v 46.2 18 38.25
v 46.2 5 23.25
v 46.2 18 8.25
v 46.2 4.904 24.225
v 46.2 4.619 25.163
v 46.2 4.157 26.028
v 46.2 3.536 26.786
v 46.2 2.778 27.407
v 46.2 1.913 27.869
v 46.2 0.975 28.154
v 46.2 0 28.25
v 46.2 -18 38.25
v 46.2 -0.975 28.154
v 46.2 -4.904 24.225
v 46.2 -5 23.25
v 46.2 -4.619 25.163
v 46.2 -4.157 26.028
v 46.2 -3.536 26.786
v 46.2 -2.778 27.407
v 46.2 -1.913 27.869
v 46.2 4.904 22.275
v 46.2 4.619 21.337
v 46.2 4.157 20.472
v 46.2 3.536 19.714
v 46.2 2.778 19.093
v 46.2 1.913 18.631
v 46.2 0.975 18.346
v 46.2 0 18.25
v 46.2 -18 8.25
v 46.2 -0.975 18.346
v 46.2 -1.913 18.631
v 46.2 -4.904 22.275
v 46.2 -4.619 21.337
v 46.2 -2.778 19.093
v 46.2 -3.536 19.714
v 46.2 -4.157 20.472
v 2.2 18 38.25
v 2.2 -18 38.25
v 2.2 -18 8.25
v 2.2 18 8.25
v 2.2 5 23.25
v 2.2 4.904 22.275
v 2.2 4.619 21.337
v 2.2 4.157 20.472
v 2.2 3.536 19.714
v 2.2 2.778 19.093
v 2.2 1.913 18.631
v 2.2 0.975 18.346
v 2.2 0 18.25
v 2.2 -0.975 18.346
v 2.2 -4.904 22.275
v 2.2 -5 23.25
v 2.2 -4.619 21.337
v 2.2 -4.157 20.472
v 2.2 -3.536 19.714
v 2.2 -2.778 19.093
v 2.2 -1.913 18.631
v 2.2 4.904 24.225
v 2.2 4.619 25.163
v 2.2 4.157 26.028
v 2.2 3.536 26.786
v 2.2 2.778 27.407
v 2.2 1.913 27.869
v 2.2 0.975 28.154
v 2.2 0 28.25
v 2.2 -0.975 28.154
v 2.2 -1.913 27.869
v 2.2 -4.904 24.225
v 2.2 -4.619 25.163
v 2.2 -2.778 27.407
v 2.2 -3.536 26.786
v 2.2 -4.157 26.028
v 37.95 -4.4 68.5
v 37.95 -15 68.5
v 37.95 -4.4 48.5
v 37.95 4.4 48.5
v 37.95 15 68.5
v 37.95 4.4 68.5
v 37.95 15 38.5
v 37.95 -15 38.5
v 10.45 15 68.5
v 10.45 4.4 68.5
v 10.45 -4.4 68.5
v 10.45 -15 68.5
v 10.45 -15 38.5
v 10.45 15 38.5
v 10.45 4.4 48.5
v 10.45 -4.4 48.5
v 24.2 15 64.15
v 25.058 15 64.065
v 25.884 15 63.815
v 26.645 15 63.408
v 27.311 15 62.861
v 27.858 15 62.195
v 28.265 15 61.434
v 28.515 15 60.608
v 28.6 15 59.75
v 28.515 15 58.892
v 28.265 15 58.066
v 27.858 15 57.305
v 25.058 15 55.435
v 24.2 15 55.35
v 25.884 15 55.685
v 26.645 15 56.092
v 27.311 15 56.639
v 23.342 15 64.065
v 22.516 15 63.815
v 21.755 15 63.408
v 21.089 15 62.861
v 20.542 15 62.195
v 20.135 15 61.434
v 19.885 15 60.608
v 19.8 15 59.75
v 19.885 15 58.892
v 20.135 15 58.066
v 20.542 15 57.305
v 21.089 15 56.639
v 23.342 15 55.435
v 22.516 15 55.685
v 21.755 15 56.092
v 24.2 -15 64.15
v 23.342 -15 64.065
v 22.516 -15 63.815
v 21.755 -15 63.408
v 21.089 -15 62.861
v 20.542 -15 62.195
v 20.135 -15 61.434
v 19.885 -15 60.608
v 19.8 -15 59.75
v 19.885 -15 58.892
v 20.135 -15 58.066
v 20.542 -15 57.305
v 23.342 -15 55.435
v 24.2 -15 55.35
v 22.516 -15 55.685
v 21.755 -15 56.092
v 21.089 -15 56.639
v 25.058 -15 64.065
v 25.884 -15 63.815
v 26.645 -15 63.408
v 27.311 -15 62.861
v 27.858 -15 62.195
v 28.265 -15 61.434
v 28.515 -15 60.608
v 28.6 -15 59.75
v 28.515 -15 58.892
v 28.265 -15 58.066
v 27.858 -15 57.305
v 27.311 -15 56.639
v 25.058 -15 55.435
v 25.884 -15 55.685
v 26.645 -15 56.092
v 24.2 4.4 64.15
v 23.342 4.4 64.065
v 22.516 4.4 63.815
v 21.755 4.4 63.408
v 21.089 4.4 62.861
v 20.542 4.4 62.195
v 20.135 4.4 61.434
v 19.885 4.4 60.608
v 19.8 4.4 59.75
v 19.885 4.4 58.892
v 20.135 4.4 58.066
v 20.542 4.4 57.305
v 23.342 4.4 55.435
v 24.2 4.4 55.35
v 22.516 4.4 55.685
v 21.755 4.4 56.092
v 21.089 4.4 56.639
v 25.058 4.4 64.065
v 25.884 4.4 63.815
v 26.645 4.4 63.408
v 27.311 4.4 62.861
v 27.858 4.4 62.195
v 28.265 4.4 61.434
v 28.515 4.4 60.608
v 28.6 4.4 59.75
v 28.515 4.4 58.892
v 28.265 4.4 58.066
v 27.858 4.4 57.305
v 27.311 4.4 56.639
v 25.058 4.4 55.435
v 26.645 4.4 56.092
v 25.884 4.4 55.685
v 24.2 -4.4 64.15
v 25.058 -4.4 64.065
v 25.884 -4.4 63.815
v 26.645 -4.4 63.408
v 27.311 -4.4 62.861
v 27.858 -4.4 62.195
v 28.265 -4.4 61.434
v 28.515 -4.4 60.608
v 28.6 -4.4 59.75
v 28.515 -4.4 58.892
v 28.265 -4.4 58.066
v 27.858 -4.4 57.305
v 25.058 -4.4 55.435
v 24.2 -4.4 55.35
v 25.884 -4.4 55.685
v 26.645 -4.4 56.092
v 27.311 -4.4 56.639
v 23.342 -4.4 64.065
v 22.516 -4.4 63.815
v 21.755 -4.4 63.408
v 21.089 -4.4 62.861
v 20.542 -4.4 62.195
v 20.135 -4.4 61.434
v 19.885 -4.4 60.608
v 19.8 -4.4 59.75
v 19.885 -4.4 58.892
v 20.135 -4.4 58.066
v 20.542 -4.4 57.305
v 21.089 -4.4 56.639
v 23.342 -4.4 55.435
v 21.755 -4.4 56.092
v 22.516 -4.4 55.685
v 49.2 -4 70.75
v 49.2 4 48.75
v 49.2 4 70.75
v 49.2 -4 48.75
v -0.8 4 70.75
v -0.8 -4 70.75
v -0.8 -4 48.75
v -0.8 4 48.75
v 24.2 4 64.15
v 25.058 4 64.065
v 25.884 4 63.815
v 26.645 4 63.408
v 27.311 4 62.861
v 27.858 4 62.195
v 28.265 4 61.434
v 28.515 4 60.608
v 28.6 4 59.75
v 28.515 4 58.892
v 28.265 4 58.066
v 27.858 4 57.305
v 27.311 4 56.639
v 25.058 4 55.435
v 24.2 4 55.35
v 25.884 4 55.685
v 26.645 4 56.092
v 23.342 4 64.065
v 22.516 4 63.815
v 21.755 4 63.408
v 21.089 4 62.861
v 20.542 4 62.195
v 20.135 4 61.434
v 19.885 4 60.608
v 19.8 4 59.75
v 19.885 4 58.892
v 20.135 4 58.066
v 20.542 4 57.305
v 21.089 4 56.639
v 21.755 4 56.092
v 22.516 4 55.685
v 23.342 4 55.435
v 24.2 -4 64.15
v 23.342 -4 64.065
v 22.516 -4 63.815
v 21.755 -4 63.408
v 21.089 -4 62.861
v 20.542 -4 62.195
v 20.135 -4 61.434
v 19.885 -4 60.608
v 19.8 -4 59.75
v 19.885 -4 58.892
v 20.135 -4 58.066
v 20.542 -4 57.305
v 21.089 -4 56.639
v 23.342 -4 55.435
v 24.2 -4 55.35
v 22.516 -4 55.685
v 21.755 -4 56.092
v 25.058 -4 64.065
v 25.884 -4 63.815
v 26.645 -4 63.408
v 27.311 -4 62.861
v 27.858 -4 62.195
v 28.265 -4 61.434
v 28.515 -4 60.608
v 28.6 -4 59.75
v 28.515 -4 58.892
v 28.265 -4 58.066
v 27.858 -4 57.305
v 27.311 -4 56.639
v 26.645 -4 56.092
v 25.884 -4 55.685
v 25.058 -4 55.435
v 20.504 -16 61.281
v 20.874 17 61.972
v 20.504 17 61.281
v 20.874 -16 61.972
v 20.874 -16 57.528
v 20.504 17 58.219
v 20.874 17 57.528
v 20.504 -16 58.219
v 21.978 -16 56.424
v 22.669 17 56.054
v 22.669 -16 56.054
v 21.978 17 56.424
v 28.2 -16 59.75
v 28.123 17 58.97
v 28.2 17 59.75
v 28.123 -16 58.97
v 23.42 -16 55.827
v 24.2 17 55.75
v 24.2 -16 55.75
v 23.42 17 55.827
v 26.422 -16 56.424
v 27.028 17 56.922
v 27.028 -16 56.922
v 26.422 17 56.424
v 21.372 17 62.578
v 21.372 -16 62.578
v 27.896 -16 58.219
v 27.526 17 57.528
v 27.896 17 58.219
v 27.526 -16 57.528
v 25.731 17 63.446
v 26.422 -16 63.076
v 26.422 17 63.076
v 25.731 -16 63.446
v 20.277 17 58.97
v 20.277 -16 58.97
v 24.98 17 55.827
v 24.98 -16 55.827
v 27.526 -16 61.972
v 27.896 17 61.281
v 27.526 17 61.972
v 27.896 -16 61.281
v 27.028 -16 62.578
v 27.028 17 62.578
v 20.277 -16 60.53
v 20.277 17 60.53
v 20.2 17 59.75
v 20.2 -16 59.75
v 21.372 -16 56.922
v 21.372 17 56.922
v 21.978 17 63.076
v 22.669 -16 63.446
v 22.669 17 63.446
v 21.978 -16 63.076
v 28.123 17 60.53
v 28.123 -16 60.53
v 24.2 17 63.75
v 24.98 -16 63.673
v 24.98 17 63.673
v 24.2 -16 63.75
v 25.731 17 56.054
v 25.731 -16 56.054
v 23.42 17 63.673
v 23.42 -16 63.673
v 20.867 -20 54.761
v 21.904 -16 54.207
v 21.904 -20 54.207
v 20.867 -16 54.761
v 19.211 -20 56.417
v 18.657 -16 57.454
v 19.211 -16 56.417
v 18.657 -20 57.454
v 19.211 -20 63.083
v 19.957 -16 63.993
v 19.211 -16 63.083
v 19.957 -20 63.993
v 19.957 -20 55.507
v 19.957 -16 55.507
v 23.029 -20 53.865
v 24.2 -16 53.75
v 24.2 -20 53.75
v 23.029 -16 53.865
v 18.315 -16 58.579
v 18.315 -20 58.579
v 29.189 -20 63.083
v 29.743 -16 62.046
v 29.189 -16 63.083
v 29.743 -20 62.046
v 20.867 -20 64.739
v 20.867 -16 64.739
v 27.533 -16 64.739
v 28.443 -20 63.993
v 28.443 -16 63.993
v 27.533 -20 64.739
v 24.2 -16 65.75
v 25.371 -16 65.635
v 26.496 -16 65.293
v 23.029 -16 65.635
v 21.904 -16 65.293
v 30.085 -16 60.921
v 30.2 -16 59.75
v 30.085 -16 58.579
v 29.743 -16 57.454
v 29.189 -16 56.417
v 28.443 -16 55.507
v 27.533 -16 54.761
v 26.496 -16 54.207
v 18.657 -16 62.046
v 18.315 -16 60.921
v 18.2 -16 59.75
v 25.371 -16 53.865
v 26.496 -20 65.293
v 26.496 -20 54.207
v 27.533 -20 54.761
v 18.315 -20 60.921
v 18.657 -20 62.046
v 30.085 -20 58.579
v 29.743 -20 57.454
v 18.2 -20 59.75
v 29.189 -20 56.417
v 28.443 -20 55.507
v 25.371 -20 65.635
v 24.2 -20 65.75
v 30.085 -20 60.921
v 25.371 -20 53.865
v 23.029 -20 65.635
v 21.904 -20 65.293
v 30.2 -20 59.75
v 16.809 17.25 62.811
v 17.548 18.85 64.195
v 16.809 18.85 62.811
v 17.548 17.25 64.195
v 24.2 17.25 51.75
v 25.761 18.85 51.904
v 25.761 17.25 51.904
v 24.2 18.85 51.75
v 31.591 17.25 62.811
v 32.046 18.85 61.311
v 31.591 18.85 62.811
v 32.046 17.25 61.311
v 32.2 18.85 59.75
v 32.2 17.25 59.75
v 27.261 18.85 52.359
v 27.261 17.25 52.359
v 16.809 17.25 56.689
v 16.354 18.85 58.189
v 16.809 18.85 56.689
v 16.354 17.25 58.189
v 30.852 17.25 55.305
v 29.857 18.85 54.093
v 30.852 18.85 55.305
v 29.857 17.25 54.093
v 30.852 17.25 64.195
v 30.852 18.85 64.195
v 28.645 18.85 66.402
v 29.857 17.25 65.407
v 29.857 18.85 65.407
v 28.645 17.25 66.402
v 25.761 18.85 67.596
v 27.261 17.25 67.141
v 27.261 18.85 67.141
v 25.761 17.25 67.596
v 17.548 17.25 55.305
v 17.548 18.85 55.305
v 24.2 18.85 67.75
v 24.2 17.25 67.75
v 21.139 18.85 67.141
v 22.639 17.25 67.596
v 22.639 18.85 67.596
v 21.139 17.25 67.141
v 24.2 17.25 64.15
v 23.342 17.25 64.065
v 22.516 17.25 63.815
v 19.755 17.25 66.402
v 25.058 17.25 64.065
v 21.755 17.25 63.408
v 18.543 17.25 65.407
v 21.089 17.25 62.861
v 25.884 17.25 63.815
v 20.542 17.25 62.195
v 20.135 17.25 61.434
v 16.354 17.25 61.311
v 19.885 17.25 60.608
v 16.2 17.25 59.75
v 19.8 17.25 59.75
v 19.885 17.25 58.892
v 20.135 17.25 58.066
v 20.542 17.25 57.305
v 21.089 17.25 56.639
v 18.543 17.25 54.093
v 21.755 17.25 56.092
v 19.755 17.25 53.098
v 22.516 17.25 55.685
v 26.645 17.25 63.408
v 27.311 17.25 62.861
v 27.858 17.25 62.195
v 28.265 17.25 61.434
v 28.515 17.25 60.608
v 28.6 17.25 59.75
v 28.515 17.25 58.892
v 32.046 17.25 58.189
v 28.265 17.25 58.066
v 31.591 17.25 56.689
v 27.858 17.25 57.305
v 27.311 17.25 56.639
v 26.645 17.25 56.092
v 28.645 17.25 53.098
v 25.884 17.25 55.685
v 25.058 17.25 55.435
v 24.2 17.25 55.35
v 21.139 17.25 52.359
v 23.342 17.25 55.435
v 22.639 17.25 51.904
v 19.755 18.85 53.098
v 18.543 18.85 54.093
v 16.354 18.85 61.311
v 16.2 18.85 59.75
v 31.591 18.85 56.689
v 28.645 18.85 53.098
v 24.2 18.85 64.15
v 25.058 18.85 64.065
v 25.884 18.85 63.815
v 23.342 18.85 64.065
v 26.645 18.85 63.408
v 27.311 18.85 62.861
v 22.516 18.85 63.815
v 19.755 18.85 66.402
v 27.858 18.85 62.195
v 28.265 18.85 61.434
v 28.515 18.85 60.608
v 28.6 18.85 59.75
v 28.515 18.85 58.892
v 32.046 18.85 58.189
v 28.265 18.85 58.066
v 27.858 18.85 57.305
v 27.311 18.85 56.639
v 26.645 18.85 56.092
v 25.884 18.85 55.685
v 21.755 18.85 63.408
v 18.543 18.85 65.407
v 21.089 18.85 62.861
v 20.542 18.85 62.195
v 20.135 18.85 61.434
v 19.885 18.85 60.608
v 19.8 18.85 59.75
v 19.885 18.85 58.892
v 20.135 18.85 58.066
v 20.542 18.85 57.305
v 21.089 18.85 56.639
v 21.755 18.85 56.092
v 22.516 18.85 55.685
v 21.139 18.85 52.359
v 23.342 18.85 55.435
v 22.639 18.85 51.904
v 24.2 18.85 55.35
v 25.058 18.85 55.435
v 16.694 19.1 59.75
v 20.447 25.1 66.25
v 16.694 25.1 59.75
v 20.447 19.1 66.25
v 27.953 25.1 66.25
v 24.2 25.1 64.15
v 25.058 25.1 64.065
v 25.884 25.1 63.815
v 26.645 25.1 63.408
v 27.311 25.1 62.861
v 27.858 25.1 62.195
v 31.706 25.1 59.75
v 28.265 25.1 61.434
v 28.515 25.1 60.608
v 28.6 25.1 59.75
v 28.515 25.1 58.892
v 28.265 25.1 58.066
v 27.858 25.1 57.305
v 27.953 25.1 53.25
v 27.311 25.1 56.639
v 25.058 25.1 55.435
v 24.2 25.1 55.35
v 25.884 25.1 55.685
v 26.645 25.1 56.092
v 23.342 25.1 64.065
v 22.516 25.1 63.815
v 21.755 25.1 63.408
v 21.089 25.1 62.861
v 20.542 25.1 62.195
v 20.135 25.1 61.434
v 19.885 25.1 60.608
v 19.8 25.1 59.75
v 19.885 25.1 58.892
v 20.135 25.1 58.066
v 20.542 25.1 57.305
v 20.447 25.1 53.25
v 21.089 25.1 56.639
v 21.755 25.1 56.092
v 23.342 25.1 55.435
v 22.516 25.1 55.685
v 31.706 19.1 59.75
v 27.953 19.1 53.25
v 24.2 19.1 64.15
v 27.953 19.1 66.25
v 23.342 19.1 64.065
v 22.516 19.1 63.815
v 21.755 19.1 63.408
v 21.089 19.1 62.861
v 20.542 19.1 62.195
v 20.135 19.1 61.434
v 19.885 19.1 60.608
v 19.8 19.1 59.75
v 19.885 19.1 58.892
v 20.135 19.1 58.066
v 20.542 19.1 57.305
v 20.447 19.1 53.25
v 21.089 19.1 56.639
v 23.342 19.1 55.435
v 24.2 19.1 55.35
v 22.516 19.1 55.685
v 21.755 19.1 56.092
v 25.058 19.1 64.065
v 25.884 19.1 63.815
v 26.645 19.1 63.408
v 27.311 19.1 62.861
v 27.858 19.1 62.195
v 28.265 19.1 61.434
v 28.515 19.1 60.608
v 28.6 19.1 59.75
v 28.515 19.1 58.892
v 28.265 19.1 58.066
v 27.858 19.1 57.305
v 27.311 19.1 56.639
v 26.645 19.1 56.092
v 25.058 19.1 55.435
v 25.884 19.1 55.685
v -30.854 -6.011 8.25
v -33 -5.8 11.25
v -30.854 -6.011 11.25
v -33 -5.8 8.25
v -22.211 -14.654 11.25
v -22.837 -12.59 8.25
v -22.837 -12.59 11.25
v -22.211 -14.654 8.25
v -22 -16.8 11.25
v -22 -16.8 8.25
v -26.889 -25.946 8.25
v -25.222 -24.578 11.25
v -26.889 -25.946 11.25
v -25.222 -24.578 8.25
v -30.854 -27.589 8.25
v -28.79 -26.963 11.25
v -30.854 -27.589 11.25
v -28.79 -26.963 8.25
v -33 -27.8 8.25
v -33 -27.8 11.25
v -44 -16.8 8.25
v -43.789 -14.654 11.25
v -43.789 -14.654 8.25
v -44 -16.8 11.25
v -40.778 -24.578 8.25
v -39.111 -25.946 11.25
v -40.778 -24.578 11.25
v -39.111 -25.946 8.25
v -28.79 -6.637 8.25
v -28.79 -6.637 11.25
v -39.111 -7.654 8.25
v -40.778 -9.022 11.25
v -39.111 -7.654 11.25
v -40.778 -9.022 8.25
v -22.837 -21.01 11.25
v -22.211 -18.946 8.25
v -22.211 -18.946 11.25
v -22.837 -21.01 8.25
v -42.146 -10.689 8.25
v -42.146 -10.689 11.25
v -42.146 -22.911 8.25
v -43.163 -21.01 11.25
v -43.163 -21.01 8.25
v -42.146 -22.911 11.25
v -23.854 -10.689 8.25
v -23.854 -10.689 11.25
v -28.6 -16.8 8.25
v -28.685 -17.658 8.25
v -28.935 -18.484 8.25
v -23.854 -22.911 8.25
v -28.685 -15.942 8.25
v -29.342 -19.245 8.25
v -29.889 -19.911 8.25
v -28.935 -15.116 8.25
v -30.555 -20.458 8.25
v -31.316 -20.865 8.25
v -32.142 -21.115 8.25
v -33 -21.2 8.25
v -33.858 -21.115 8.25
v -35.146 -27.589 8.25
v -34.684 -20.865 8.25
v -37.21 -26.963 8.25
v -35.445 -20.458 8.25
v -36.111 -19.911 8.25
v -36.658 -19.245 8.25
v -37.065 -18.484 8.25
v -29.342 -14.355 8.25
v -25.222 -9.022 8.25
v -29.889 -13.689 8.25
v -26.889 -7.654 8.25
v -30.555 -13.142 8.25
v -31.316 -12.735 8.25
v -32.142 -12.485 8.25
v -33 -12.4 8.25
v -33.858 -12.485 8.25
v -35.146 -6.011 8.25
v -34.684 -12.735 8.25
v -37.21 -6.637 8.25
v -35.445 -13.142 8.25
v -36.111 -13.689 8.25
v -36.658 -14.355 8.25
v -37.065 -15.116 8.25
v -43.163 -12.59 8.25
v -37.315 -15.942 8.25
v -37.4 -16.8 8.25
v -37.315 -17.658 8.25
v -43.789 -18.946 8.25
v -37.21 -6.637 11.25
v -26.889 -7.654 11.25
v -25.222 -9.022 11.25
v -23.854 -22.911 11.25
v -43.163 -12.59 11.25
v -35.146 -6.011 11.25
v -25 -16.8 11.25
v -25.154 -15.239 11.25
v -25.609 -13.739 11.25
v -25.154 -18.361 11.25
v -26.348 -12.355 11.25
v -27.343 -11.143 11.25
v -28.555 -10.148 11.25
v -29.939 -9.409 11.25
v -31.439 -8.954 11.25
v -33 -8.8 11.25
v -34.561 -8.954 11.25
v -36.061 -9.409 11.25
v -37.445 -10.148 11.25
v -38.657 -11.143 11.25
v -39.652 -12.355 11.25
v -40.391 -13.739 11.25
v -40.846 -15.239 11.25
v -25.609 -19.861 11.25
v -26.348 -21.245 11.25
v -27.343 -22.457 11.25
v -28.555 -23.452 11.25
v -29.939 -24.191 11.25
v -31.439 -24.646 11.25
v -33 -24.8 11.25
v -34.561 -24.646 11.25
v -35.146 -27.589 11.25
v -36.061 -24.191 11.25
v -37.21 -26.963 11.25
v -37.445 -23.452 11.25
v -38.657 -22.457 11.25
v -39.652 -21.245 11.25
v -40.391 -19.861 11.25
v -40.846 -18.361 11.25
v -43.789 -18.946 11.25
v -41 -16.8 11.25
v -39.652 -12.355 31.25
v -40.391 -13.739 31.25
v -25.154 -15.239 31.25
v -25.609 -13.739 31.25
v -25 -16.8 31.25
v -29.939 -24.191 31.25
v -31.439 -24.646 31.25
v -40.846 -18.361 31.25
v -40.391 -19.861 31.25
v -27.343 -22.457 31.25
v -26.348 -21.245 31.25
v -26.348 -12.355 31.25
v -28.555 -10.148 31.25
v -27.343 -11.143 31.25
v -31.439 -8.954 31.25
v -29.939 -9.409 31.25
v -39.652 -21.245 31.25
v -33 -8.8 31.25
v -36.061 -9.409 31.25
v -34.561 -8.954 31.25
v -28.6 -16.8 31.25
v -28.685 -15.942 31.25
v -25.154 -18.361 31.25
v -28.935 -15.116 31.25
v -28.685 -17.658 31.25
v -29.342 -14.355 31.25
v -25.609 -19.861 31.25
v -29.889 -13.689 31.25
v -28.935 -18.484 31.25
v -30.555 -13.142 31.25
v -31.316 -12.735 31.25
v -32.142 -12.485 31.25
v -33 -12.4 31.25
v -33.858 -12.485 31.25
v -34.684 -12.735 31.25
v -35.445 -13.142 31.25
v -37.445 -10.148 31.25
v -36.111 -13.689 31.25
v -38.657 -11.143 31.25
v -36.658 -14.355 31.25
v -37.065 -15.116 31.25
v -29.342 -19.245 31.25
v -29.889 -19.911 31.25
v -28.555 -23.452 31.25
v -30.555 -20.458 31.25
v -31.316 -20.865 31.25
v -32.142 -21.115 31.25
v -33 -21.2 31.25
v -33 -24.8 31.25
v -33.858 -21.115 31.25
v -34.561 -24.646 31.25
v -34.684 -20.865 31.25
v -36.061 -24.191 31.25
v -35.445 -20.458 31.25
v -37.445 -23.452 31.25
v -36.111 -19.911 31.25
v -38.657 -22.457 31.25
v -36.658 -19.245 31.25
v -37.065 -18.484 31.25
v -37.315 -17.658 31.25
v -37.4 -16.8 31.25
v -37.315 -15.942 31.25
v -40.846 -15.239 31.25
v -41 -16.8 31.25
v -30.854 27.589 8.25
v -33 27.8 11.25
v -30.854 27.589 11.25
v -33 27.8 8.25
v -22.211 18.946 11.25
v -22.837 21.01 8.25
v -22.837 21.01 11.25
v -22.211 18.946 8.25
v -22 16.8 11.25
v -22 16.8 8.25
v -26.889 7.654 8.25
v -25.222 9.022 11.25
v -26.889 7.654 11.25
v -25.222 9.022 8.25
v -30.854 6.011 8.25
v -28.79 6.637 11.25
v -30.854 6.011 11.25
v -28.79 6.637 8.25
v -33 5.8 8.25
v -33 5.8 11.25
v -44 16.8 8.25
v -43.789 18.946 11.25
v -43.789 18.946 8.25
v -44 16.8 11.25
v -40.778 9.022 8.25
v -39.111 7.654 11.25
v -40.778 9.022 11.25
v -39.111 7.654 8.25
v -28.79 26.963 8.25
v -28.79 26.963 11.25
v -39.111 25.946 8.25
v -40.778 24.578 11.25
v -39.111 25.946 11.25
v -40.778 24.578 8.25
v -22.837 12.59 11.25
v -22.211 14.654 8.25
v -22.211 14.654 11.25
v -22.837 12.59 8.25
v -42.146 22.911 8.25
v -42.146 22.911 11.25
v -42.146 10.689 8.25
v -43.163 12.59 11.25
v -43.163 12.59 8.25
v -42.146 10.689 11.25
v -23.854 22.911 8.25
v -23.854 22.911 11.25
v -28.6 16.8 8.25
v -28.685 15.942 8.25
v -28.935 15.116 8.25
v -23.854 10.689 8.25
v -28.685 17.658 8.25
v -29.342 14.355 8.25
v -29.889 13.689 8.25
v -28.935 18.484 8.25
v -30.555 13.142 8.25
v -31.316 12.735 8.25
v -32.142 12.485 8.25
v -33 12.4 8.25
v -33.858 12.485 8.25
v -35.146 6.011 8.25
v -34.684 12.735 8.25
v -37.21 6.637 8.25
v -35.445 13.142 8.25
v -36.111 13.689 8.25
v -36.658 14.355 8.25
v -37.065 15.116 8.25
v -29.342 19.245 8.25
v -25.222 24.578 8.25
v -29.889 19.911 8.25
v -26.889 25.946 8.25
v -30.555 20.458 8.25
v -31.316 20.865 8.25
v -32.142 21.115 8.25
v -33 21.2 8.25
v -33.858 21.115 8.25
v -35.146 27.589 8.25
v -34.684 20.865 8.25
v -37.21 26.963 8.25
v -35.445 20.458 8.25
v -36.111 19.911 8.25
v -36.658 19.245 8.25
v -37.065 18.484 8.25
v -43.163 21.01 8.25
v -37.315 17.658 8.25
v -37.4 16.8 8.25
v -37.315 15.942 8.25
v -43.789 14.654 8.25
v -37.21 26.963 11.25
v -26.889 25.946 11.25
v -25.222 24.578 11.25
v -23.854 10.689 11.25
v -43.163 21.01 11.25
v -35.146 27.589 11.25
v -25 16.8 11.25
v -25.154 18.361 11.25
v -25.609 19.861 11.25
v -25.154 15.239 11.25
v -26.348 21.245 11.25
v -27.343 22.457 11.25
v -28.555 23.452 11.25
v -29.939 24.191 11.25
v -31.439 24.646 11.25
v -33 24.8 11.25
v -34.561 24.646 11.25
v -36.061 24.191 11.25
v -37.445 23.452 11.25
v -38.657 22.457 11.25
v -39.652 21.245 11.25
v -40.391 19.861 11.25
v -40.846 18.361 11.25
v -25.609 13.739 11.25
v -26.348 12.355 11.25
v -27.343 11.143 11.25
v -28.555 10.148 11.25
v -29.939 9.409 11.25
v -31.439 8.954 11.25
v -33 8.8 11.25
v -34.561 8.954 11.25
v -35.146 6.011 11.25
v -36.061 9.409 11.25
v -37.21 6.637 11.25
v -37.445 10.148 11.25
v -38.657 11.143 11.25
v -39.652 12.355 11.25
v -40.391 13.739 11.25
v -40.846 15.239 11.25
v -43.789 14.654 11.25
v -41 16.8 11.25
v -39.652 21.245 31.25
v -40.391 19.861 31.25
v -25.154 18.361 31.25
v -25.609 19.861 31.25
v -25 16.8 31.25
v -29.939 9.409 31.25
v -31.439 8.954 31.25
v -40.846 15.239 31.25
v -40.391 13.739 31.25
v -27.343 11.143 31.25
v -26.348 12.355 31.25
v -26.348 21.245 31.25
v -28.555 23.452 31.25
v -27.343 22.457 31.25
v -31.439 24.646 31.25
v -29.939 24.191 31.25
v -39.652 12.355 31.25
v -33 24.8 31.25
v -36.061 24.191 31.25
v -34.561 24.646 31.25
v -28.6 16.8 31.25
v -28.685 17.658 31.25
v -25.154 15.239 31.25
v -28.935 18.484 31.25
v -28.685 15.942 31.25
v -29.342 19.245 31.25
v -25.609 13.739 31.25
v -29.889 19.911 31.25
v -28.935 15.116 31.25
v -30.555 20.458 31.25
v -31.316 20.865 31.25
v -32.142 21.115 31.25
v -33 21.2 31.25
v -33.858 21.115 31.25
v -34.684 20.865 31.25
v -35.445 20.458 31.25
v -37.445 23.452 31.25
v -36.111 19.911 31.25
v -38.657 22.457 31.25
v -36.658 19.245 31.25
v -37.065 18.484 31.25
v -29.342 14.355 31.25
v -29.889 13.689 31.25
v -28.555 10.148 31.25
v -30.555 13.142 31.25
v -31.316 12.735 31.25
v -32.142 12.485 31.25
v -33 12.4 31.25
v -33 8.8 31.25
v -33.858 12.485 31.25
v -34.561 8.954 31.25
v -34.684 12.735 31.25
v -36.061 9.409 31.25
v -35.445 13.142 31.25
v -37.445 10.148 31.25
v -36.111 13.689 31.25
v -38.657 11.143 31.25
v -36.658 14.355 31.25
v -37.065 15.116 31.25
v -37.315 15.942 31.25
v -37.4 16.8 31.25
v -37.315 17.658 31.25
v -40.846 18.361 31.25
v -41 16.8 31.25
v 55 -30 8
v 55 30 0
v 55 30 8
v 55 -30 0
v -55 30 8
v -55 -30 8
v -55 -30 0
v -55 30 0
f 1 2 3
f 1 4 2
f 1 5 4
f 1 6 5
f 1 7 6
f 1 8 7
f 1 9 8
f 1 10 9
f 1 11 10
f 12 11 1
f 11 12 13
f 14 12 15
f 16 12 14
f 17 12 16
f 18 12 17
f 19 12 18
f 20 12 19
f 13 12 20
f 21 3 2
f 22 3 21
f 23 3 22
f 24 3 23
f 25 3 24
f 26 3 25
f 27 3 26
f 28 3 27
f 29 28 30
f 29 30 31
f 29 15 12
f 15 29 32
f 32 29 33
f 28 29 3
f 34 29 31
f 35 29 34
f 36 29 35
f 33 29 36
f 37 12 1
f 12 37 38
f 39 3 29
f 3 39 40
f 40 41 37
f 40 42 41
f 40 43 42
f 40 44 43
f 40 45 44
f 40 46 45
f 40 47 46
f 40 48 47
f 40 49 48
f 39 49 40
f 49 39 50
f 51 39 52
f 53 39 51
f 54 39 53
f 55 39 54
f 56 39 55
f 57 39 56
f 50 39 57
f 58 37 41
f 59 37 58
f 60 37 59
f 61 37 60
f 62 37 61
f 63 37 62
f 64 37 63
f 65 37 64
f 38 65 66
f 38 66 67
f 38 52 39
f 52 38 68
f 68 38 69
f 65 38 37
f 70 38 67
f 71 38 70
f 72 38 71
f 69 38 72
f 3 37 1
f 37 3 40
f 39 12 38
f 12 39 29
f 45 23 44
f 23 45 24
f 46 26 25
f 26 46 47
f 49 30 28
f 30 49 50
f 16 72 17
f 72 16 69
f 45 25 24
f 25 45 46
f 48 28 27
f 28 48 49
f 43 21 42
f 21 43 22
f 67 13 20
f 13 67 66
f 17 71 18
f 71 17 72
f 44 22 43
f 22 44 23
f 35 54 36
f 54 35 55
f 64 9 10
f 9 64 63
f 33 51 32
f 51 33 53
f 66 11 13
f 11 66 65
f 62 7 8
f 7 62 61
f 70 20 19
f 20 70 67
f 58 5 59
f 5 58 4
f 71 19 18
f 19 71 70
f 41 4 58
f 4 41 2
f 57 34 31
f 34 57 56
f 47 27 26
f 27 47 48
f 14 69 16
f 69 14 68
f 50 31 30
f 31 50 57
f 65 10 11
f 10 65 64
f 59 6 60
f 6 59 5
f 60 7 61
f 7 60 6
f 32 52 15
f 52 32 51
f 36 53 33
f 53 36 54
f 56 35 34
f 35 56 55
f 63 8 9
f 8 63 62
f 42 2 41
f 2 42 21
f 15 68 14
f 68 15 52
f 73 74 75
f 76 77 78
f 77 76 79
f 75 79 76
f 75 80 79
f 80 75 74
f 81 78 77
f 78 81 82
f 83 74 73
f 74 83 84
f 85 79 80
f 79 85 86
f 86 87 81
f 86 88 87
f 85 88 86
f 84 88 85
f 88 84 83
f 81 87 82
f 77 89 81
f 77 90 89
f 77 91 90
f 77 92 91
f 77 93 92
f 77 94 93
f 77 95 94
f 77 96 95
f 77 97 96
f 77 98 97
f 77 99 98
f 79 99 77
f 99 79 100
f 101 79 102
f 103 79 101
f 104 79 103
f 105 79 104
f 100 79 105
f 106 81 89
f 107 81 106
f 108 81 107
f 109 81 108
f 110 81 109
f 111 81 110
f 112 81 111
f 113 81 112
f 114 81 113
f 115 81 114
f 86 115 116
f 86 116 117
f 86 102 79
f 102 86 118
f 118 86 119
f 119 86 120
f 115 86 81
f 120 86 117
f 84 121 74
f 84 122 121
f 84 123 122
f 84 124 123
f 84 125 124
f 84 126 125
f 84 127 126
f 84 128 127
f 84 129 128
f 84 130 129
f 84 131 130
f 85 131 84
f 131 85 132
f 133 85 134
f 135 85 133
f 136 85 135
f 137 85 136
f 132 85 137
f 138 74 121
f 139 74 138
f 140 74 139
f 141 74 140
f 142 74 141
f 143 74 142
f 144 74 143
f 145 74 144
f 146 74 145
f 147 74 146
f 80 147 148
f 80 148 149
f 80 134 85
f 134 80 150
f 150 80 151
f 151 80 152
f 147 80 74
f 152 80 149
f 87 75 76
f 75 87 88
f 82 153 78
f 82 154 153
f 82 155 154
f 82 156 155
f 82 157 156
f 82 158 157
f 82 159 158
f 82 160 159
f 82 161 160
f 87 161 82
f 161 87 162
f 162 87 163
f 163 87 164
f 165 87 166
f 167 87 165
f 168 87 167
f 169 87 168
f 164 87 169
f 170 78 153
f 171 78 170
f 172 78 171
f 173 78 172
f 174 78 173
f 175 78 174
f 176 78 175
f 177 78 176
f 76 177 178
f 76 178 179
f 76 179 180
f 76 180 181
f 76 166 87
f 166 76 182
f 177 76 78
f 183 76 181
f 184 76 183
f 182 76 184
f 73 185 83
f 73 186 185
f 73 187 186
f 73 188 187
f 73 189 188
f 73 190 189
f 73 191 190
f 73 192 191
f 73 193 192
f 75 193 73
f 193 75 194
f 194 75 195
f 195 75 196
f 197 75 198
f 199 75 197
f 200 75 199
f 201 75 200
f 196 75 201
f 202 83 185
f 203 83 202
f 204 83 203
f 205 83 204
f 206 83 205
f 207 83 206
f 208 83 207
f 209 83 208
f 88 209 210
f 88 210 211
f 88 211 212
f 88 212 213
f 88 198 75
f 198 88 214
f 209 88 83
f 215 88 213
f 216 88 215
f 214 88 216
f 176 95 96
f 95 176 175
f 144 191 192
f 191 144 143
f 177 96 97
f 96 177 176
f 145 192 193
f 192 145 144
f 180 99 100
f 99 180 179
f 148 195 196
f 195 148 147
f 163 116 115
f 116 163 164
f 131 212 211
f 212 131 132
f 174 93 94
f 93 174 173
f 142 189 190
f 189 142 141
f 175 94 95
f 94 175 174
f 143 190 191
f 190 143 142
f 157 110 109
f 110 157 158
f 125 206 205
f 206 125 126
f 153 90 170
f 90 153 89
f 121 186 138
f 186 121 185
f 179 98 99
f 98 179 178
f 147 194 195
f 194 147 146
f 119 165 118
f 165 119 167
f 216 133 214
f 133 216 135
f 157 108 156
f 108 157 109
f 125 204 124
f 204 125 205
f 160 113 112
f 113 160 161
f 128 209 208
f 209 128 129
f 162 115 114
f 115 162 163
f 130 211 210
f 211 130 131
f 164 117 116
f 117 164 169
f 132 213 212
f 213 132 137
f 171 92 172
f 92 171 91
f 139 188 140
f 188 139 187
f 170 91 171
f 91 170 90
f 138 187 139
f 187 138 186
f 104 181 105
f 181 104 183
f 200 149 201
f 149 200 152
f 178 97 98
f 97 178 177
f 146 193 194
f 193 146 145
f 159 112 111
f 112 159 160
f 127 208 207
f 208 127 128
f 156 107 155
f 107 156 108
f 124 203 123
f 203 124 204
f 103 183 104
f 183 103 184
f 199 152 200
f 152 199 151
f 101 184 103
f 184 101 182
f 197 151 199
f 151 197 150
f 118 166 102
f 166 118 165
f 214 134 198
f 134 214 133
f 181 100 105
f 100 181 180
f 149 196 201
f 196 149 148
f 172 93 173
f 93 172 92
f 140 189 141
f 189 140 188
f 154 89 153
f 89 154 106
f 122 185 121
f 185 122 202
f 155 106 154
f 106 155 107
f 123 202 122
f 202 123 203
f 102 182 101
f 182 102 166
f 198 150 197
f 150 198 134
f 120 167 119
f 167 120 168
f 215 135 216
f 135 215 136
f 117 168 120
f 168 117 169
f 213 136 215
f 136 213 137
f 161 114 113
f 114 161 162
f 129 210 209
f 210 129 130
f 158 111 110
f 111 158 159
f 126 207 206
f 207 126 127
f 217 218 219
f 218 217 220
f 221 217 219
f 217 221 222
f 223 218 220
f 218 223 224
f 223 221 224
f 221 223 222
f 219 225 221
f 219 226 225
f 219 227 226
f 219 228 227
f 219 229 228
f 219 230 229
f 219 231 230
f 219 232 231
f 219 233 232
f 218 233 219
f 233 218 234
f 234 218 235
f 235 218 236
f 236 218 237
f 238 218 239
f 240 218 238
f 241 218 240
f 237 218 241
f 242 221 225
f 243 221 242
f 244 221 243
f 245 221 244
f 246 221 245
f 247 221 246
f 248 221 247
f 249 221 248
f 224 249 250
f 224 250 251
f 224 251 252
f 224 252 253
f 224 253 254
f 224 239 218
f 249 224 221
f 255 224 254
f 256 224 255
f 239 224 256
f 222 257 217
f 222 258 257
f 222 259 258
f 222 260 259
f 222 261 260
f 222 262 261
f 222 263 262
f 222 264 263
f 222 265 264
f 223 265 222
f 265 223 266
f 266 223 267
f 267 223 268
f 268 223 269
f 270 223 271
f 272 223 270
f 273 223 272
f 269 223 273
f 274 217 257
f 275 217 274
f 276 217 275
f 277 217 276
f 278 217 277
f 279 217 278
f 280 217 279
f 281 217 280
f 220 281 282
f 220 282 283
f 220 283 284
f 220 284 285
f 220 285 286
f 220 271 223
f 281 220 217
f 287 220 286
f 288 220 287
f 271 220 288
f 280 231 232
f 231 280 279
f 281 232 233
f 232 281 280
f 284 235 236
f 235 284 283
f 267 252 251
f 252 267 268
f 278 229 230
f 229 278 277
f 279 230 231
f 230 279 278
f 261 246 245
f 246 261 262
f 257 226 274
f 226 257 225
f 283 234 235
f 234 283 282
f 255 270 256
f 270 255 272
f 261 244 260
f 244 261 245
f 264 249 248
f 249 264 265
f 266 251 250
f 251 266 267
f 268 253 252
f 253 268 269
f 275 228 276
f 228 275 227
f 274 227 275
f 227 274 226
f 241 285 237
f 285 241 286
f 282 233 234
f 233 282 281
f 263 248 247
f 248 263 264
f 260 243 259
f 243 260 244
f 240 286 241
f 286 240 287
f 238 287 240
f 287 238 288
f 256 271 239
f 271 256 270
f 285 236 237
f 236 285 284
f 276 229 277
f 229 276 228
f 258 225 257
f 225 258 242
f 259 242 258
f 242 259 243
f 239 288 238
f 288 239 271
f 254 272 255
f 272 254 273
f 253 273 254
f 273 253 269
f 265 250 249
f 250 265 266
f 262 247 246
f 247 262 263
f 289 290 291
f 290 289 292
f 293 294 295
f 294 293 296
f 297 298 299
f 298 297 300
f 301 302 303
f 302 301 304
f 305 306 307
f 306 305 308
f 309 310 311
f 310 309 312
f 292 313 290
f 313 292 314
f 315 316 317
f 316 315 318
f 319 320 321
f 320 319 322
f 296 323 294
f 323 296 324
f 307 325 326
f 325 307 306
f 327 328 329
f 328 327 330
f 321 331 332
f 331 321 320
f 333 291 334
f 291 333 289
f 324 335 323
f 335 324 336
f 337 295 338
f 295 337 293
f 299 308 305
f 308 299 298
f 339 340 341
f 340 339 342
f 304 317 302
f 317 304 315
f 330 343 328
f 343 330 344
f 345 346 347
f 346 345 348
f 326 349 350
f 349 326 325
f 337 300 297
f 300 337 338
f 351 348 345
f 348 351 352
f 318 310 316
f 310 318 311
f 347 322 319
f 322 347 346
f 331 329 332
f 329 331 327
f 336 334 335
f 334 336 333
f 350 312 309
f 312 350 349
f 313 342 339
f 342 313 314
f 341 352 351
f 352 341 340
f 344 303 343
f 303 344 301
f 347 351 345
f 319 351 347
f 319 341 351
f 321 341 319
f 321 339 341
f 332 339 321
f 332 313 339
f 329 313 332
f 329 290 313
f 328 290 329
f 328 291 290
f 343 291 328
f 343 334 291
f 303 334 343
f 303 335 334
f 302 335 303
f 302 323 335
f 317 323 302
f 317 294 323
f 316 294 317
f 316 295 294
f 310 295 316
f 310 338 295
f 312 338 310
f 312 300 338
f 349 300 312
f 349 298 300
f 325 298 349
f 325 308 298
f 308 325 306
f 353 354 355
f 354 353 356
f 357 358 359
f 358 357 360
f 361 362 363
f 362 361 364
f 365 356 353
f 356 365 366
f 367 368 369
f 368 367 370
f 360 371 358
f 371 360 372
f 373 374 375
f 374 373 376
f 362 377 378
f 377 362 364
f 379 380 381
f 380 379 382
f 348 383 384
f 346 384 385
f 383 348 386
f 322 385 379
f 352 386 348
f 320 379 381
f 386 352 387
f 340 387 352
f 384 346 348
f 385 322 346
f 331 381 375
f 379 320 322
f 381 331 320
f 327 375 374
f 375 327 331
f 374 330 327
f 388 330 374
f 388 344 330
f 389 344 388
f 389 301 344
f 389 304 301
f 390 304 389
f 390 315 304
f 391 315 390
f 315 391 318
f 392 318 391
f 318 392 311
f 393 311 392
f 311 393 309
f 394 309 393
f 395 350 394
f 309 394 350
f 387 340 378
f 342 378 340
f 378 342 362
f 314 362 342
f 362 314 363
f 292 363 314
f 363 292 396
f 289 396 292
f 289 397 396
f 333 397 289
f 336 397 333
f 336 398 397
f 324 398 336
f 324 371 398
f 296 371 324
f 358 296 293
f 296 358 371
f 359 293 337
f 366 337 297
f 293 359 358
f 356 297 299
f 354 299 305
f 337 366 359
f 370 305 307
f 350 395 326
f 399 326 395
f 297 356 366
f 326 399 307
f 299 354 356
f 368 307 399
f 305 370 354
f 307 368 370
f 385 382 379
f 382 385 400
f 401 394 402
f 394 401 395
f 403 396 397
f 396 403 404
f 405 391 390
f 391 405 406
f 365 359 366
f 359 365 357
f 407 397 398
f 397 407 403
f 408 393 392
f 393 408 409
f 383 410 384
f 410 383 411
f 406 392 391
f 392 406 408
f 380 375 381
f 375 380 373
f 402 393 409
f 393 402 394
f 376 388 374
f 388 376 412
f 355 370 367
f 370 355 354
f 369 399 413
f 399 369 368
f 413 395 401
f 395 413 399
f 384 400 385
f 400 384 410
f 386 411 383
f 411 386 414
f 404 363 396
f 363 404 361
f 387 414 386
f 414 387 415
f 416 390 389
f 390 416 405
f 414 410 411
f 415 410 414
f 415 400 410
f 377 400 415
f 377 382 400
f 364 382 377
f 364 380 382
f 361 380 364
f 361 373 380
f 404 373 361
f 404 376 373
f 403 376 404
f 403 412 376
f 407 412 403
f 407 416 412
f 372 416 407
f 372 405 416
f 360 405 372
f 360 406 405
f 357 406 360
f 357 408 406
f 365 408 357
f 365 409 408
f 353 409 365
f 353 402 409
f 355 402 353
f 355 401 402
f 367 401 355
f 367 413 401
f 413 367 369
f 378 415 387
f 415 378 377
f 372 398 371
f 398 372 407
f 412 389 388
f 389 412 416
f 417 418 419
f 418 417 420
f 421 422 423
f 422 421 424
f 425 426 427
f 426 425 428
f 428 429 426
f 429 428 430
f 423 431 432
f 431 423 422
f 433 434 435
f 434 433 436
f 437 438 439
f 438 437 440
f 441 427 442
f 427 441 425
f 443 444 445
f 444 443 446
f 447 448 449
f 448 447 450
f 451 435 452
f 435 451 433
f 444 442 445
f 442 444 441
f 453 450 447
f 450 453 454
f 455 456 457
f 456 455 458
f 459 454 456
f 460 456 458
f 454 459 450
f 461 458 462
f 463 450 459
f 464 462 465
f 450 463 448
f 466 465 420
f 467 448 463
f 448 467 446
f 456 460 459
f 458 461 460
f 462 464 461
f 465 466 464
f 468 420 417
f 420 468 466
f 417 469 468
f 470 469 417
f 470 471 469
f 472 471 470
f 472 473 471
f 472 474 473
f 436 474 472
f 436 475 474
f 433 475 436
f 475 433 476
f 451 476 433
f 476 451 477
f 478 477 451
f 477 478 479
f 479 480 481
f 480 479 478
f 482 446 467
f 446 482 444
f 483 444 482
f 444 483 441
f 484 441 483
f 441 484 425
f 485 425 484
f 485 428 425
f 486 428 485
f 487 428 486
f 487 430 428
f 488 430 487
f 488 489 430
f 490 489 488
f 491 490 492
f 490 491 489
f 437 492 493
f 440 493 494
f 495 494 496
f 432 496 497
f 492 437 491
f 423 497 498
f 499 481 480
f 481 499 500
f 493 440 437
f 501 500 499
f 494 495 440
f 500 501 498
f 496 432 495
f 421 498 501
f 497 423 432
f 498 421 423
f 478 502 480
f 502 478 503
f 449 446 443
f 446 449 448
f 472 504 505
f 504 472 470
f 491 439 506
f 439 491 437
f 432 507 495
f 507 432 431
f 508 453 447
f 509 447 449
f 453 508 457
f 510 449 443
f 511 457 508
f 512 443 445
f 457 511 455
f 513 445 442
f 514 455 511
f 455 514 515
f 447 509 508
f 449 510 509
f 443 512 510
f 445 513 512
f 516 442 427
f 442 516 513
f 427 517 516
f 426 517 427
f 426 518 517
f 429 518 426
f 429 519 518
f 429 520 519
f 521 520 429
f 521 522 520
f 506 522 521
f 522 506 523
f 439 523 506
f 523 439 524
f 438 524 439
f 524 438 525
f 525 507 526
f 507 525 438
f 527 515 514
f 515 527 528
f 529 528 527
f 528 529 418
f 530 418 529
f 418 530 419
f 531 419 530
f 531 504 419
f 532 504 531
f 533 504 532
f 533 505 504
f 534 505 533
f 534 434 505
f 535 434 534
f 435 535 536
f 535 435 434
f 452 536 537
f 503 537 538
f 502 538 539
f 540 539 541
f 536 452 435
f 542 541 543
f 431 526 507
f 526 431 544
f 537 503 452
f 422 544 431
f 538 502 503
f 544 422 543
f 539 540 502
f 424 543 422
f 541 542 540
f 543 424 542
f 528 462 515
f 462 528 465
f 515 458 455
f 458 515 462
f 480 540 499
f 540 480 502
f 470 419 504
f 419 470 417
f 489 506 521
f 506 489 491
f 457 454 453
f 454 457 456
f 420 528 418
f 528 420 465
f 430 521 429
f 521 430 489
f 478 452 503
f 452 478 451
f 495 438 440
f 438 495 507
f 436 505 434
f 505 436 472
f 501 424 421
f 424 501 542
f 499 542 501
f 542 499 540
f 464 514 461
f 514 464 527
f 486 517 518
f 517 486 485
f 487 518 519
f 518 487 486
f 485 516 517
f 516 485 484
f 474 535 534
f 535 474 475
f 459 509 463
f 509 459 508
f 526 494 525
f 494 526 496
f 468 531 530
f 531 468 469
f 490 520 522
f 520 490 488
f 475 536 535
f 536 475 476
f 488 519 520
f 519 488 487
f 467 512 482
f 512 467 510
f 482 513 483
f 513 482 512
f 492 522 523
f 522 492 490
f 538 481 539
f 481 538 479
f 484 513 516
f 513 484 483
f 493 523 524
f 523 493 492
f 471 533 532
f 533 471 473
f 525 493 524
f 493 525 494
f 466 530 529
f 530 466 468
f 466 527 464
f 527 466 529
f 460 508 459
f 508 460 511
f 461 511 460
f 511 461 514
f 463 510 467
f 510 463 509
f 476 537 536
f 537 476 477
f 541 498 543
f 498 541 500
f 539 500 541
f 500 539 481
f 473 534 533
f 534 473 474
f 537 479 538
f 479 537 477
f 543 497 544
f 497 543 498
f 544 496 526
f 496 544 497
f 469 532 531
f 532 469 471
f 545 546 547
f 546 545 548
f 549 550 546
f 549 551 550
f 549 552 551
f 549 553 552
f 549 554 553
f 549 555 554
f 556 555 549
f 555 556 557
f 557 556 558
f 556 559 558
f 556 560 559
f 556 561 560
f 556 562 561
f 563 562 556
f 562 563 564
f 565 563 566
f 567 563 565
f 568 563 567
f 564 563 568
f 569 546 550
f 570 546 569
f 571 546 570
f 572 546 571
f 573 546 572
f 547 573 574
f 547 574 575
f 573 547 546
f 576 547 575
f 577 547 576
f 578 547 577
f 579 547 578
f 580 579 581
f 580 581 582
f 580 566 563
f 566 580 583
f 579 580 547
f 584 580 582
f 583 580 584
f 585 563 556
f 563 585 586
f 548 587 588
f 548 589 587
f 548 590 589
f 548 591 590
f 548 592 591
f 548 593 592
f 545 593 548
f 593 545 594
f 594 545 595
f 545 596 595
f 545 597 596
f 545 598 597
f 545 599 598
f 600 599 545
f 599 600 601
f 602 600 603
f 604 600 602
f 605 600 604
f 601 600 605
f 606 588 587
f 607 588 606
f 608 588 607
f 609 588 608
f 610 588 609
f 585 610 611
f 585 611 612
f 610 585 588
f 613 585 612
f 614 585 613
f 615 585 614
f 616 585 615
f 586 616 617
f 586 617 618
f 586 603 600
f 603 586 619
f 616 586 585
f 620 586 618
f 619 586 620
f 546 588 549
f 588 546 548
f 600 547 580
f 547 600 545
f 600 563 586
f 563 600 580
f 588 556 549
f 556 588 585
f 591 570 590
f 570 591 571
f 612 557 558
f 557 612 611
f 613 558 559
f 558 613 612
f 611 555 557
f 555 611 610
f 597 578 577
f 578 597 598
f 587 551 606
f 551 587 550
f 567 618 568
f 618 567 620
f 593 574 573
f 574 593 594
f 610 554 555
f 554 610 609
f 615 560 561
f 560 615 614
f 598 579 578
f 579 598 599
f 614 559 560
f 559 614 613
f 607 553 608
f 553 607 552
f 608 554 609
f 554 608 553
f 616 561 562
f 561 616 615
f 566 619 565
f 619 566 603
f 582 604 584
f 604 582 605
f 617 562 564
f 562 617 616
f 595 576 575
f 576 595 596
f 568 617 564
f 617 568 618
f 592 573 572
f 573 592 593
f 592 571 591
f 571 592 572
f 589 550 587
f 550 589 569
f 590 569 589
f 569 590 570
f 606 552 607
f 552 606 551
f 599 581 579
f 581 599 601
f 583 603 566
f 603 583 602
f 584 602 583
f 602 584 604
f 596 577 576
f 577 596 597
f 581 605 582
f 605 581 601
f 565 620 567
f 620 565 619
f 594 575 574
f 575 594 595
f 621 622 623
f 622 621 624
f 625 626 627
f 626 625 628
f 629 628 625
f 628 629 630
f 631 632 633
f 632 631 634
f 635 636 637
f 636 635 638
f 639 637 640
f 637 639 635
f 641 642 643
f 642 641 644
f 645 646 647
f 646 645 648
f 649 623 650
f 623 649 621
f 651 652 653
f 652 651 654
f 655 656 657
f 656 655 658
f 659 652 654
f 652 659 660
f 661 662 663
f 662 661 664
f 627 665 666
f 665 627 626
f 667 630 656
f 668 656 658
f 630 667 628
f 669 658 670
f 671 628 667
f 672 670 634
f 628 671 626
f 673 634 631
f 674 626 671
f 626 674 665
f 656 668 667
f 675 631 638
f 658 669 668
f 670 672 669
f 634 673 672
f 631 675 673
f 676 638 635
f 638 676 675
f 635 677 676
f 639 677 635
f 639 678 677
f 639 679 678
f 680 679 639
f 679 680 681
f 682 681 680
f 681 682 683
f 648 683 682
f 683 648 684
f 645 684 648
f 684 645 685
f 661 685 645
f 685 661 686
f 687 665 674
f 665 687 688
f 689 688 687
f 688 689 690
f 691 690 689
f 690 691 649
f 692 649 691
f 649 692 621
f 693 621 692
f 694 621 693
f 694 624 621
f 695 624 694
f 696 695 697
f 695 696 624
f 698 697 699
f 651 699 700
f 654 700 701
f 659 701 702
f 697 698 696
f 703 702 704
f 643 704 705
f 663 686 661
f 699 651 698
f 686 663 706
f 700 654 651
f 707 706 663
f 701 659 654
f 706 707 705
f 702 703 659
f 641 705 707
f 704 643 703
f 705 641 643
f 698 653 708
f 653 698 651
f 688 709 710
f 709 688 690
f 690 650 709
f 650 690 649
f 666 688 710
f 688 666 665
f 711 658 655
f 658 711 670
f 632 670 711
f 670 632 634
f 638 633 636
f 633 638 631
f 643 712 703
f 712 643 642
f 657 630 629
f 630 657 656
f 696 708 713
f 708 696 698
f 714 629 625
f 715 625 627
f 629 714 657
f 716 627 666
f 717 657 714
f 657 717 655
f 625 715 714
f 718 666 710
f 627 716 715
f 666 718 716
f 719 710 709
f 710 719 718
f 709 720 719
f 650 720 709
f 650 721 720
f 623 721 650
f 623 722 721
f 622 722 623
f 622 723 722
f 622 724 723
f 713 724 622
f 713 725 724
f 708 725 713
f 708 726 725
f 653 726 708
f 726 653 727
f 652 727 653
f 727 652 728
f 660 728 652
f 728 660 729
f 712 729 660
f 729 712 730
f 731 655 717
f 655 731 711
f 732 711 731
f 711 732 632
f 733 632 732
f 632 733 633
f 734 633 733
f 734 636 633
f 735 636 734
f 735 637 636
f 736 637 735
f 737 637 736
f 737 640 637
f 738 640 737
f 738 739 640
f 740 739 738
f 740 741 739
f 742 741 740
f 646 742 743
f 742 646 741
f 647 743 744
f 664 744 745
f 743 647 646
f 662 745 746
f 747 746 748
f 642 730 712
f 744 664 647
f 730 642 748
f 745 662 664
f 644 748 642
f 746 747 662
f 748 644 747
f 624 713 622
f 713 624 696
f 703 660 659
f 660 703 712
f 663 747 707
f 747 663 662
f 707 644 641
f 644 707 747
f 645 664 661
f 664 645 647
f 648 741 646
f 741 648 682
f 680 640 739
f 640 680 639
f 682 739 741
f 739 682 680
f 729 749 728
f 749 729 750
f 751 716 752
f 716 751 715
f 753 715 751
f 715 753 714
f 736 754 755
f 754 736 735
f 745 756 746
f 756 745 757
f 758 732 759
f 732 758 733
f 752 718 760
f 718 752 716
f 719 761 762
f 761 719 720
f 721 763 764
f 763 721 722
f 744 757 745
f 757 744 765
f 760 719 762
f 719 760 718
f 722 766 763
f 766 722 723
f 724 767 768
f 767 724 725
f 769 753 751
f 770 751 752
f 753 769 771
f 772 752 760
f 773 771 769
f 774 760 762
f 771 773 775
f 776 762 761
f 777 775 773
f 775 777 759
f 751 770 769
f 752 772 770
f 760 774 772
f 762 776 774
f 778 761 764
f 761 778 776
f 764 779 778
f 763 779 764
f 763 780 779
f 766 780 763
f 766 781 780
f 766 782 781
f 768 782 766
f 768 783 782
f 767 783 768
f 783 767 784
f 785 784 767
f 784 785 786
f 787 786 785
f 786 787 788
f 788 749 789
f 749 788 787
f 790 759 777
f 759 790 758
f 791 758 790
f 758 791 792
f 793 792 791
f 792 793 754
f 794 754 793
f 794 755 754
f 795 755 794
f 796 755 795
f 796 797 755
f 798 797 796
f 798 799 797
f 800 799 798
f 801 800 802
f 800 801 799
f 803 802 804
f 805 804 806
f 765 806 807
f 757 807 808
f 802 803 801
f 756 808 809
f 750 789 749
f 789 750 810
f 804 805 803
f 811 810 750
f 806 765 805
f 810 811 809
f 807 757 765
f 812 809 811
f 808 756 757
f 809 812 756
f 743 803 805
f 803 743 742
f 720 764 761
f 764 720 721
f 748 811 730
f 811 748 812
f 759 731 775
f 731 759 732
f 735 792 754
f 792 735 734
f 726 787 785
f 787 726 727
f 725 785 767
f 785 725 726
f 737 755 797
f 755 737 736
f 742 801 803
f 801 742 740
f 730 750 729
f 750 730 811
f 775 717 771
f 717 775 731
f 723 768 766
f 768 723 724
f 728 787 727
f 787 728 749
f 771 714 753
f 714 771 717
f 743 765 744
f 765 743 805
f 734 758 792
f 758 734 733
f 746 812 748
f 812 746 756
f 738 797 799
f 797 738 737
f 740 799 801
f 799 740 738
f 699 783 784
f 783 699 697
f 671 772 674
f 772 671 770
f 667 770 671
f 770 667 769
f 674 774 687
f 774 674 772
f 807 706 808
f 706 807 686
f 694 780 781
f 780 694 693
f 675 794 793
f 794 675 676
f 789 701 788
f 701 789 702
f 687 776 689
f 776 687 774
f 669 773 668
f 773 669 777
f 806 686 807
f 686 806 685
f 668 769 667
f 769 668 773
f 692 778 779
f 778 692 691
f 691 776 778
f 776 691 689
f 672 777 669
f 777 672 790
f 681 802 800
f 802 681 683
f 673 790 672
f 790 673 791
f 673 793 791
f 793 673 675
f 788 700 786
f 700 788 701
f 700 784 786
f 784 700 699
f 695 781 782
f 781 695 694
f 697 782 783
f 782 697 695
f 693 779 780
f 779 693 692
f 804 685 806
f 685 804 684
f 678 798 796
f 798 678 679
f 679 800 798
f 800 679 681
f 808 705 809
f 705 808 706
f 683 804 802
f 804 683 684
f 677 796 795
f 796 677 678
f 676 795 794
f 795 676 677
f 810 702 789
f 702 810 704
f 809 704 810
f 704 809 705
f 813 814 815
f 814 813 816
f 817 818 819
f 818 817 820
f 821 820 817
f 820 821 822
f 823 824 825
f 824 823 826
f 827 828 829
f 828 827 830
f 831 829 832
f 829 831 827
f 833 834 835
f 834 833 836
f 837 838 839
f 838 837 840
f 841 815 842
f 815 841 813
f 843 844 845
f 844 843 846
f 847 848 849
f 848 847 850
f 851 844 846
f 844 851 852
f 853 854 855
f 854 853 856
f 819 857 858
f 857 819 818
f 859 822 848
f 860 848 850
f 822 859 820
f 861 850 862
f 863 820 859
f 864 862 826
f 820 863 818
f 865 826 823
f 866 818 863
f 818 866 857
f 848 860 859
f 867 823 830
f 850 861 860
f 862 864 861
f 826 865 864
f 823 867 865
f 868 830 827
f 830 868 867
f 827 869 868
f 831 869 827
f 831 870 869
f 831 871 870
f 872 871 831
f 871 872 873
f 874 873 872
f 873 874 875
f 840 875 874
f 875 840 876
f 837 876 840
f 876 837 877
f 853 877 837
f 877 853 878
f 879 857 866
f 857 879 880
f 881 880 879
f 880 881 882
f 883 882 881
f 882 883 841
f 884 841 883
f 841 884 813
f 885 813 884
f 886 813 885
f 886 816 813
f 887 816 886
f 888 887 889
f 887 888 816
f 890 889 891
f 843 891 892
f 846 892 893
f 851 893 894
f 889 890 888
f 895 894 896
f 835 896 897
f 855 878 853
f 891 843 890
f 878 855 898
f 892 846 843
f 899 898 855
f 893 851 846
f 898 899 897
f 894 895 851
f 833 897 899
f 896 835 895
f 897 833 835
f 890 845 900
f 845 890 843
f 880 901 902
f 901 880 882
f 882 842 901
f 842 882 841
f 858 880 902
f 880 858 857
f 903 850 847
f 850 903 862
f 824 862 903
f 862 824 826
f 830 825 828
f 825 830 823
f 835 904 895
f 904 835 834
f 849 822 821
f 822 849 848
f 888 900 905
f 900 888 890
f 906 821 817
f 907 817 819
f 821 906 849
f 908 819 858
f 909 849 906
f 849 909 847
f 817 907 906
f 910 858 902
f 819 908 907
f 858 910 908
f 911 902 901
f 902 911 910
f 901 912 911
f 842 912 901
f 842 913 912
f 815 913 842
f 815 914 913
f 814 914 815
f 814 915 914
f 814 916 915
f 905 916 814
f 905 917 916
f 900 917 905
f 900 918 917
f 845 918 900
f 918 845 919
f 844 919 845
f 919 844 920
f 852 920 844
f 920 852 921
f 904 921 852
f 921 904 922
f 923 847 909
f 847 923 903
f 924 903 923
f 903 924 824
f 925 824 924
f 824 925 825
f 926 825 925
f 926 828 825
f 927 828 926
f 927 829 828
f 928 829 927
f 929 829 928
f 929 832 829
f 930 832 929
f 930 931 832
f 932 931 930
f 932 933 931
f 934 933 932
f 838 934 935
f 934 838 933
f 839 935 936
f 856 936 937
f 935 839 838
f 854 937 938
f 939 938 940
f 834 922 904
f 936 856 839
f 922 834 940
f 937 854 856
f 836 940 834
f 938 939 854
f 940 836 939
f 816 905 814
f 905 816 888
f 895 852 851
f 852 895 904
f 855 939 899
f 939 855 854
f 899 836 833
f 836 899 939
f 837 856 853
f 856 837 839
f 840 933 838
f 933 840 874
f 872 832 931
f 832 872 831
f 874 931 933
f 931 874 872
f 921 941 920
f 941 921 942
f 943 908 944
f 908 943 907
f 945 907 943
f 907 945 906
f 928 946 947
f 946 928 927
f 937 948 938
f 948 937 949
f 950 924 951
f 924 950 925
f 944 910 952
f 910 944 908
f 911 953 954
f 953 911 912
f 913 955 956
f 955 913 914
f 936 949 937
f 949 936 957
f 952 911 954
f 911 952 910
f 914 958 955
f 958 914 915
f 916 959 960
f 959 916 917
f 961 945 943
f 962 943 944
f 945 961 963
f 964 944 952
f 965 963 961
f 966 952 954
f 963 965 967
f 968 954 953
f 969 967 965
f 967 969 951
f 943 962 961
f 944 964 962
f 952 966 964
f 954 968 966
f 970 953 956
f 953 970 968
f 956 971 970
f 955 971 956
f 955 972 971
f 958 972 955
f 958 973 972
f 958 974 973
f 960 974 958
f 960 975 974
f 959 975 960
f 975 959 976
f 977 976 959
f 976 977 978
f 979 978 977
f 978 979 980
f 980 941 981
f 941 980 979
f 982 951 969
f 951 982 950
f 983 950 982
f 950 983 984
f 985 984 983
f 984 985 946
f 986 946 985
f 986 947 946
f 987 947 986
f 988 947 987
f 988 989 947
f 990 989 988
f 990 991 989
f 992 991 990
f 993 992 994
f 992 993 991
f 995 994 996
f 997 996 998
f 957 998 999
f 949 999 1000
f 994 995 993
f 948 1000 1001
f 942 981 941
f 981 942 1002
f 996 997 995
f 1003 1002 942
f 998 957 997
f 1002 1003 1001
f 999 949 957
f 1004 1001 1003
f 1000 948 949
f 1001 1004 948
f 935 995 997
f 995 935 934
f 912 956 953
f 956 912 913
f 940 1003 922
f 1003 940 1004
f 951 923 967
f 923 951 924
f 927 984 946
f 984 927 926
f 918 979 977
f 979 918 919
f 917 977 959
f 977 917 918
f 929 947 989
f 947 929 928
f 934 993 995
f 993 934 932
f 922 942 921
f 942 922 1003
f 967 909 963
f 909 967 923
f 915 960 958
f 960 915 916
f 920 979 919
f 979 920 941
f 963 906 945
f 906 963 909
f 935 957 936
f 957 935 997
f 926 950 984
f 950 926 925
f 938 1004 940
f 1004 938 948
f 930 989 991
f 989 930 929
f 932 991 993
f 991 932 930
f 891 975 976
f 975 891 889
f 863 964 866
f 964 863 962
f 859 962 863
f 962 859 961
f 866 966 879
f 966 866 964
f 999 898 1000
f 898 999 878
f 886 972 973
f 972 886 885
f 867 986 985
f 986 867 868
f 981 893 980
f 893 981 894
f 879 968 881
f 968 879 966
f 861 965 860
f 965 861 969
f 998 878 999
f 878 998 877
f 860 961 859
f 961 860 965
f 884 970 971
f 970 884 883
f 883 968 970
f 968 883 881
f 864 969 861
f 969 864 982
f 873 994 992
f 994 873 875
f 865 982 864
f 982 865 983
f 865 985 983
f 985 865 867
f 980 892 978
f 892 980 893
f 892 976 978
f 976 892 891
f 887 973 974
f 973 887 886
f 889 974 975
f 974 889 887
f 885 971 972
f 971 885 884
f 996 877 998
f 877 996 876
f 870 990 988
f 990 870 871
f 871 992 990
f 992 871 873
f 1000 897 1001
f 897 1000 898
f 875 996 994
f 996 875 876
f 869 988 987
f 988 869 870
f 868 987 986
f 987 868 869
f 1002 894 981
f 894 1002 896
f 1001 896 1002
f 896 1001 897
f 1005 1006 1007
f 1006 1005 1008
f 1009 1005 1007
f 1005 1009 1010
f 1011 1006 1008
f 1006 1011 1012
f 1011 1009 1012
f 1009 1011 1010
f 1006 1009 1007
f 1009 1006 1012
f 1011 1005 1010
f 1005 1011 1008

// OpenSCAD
$fn = 32;

// ------------------------------------------------------------------------
// Indexing jig: plate 110 x 60 mm, pin d8
// Every part is its own module, assembly() places every instance.
// ------------------------------------------------------------------------

// --- part 1 ---
module jig_plate() {
  difference() {
    translate([-55, -30, 0]) cube([110, 60, 8]);
  }
}

// --- part 2 ---
module locator_block() {
  difference() {
    translate([-22, -18, 0]) cube([44, 36, 30]);
    translate([0, 0, 15]) rotate([0, 90, 0]) cylinder(h = 46, d = 10, center = true);
  }
}

// --- part 3 ---
module index_fork() {
  difference() {
    translate([-13.75, -15, 0]) cube([27.5, 30, 30]);
    translate([-14.75, -4.4, 10]) cube([29.5, 8.8, 21]);
    translate([0, 0, 21.25]) rotate([90, 0, 0]) cylinder(h = 32, d = 8.8, center = true);
  }
}

// --- part 4 ---
module index_arm() {
  difference() {
    translate([-25, -4, 0]) cube([50, 8, 22]);
    translate([0, 0, 11]) rotate([90, 0, 0]) cylinder(h = 10, d = 8.8, center = true);
  }
}

// --- part 5 ---
module index_pin() {
  rotate([0, 90, 0]) cylinder(h = 34, d = 8, center = true);
  translate([-20, 0, 0]) rotate([0, 90, 0]) cylinder(h = 4, d = 12);
}

// --- part 6 ---
module pin_washer() {
  difference() {
      translate([0, 0, 0]) cylinder(h = 1.6, d = 16);
      translate([0, 0, -1]) cylinder(h = 3.6, d = 8.8);
    }
}

// --- part 7 ---
module lock_nut() {
  difference() {
    linear_extrude(height = 6) polygon(points = [[7.506, 0], [3.753, 6.5], [-3.753, 6.5], [-7.506, 0], [-3.753, -6.5], [3.753, -6.5]]);
    translate([0, 0, -1]) cylinder(h = 8, d = 8.8);
  }
}

// --- part 8 ---
module guide_bush_a() {
  difference() {
    union() {
      cylinder(h = 3, d = 22);
      translate([0, 0, 3]) cylinder(h = 20, d = 16);
    }
    translate([0, 0, -1]) cylinder(h = 25, d = 8.8);
  }
}

// --- part 9 ---
module guide_bush_b() {
  difference() {
    union() {
      cylinder(h = 3, d = 22);
      translate([0, 0, 3]) cylinder(h = 20, d = 16);
    }
    translate([0, 0, -1]) cylinder(h = 25, d = 8.8);
  }
}

// --- assembly ---
module assembly() {
  color([0.80, 0.24, 0.20]) translate([0, 0, 0]) rotate([0, 0, 0]) jig_plate();
  color([0.20, 0.45, 0.75]) translate([24.2, 0, 8.25]) rotate([0, 0, 0]) locator_block();
  color([0.25, 0.62, 0.32]) translate([24.2, 0, 38.5]) rotate([0, 0, 0]) index_fork();
  color([0.92, 0.70, 0.18]) translate([24.2, 0, 48.75]) rotate([0, 0, 0]) index_arm();
  color([0.58, 0.35, 0.70]) translate([24.2, 0, 59.75]) rotate([0, 0, 90]) index_pin();
  color([0.16, 0.66, 0.66]) translate([24.2, 18.85, 59.75]) rotate([90, 0, 0]) pin_washer();
  color([0.85, 0.48, 0.18]) translate([24.2, 25.1, 59.75]) rotate([90, 0, 0]) lock_nut();
  color([0.55, 0.60, 0.65]) translate([-33, -16.8, 8.25]) rotate([0, 0, 0]) guide_bush_a();
  color([0.75, 0.30, 0.55]) translate([-33, 16.8, 8.25]) rotate([0, 0, 0]) guide_bush_b();
}

assembly();
